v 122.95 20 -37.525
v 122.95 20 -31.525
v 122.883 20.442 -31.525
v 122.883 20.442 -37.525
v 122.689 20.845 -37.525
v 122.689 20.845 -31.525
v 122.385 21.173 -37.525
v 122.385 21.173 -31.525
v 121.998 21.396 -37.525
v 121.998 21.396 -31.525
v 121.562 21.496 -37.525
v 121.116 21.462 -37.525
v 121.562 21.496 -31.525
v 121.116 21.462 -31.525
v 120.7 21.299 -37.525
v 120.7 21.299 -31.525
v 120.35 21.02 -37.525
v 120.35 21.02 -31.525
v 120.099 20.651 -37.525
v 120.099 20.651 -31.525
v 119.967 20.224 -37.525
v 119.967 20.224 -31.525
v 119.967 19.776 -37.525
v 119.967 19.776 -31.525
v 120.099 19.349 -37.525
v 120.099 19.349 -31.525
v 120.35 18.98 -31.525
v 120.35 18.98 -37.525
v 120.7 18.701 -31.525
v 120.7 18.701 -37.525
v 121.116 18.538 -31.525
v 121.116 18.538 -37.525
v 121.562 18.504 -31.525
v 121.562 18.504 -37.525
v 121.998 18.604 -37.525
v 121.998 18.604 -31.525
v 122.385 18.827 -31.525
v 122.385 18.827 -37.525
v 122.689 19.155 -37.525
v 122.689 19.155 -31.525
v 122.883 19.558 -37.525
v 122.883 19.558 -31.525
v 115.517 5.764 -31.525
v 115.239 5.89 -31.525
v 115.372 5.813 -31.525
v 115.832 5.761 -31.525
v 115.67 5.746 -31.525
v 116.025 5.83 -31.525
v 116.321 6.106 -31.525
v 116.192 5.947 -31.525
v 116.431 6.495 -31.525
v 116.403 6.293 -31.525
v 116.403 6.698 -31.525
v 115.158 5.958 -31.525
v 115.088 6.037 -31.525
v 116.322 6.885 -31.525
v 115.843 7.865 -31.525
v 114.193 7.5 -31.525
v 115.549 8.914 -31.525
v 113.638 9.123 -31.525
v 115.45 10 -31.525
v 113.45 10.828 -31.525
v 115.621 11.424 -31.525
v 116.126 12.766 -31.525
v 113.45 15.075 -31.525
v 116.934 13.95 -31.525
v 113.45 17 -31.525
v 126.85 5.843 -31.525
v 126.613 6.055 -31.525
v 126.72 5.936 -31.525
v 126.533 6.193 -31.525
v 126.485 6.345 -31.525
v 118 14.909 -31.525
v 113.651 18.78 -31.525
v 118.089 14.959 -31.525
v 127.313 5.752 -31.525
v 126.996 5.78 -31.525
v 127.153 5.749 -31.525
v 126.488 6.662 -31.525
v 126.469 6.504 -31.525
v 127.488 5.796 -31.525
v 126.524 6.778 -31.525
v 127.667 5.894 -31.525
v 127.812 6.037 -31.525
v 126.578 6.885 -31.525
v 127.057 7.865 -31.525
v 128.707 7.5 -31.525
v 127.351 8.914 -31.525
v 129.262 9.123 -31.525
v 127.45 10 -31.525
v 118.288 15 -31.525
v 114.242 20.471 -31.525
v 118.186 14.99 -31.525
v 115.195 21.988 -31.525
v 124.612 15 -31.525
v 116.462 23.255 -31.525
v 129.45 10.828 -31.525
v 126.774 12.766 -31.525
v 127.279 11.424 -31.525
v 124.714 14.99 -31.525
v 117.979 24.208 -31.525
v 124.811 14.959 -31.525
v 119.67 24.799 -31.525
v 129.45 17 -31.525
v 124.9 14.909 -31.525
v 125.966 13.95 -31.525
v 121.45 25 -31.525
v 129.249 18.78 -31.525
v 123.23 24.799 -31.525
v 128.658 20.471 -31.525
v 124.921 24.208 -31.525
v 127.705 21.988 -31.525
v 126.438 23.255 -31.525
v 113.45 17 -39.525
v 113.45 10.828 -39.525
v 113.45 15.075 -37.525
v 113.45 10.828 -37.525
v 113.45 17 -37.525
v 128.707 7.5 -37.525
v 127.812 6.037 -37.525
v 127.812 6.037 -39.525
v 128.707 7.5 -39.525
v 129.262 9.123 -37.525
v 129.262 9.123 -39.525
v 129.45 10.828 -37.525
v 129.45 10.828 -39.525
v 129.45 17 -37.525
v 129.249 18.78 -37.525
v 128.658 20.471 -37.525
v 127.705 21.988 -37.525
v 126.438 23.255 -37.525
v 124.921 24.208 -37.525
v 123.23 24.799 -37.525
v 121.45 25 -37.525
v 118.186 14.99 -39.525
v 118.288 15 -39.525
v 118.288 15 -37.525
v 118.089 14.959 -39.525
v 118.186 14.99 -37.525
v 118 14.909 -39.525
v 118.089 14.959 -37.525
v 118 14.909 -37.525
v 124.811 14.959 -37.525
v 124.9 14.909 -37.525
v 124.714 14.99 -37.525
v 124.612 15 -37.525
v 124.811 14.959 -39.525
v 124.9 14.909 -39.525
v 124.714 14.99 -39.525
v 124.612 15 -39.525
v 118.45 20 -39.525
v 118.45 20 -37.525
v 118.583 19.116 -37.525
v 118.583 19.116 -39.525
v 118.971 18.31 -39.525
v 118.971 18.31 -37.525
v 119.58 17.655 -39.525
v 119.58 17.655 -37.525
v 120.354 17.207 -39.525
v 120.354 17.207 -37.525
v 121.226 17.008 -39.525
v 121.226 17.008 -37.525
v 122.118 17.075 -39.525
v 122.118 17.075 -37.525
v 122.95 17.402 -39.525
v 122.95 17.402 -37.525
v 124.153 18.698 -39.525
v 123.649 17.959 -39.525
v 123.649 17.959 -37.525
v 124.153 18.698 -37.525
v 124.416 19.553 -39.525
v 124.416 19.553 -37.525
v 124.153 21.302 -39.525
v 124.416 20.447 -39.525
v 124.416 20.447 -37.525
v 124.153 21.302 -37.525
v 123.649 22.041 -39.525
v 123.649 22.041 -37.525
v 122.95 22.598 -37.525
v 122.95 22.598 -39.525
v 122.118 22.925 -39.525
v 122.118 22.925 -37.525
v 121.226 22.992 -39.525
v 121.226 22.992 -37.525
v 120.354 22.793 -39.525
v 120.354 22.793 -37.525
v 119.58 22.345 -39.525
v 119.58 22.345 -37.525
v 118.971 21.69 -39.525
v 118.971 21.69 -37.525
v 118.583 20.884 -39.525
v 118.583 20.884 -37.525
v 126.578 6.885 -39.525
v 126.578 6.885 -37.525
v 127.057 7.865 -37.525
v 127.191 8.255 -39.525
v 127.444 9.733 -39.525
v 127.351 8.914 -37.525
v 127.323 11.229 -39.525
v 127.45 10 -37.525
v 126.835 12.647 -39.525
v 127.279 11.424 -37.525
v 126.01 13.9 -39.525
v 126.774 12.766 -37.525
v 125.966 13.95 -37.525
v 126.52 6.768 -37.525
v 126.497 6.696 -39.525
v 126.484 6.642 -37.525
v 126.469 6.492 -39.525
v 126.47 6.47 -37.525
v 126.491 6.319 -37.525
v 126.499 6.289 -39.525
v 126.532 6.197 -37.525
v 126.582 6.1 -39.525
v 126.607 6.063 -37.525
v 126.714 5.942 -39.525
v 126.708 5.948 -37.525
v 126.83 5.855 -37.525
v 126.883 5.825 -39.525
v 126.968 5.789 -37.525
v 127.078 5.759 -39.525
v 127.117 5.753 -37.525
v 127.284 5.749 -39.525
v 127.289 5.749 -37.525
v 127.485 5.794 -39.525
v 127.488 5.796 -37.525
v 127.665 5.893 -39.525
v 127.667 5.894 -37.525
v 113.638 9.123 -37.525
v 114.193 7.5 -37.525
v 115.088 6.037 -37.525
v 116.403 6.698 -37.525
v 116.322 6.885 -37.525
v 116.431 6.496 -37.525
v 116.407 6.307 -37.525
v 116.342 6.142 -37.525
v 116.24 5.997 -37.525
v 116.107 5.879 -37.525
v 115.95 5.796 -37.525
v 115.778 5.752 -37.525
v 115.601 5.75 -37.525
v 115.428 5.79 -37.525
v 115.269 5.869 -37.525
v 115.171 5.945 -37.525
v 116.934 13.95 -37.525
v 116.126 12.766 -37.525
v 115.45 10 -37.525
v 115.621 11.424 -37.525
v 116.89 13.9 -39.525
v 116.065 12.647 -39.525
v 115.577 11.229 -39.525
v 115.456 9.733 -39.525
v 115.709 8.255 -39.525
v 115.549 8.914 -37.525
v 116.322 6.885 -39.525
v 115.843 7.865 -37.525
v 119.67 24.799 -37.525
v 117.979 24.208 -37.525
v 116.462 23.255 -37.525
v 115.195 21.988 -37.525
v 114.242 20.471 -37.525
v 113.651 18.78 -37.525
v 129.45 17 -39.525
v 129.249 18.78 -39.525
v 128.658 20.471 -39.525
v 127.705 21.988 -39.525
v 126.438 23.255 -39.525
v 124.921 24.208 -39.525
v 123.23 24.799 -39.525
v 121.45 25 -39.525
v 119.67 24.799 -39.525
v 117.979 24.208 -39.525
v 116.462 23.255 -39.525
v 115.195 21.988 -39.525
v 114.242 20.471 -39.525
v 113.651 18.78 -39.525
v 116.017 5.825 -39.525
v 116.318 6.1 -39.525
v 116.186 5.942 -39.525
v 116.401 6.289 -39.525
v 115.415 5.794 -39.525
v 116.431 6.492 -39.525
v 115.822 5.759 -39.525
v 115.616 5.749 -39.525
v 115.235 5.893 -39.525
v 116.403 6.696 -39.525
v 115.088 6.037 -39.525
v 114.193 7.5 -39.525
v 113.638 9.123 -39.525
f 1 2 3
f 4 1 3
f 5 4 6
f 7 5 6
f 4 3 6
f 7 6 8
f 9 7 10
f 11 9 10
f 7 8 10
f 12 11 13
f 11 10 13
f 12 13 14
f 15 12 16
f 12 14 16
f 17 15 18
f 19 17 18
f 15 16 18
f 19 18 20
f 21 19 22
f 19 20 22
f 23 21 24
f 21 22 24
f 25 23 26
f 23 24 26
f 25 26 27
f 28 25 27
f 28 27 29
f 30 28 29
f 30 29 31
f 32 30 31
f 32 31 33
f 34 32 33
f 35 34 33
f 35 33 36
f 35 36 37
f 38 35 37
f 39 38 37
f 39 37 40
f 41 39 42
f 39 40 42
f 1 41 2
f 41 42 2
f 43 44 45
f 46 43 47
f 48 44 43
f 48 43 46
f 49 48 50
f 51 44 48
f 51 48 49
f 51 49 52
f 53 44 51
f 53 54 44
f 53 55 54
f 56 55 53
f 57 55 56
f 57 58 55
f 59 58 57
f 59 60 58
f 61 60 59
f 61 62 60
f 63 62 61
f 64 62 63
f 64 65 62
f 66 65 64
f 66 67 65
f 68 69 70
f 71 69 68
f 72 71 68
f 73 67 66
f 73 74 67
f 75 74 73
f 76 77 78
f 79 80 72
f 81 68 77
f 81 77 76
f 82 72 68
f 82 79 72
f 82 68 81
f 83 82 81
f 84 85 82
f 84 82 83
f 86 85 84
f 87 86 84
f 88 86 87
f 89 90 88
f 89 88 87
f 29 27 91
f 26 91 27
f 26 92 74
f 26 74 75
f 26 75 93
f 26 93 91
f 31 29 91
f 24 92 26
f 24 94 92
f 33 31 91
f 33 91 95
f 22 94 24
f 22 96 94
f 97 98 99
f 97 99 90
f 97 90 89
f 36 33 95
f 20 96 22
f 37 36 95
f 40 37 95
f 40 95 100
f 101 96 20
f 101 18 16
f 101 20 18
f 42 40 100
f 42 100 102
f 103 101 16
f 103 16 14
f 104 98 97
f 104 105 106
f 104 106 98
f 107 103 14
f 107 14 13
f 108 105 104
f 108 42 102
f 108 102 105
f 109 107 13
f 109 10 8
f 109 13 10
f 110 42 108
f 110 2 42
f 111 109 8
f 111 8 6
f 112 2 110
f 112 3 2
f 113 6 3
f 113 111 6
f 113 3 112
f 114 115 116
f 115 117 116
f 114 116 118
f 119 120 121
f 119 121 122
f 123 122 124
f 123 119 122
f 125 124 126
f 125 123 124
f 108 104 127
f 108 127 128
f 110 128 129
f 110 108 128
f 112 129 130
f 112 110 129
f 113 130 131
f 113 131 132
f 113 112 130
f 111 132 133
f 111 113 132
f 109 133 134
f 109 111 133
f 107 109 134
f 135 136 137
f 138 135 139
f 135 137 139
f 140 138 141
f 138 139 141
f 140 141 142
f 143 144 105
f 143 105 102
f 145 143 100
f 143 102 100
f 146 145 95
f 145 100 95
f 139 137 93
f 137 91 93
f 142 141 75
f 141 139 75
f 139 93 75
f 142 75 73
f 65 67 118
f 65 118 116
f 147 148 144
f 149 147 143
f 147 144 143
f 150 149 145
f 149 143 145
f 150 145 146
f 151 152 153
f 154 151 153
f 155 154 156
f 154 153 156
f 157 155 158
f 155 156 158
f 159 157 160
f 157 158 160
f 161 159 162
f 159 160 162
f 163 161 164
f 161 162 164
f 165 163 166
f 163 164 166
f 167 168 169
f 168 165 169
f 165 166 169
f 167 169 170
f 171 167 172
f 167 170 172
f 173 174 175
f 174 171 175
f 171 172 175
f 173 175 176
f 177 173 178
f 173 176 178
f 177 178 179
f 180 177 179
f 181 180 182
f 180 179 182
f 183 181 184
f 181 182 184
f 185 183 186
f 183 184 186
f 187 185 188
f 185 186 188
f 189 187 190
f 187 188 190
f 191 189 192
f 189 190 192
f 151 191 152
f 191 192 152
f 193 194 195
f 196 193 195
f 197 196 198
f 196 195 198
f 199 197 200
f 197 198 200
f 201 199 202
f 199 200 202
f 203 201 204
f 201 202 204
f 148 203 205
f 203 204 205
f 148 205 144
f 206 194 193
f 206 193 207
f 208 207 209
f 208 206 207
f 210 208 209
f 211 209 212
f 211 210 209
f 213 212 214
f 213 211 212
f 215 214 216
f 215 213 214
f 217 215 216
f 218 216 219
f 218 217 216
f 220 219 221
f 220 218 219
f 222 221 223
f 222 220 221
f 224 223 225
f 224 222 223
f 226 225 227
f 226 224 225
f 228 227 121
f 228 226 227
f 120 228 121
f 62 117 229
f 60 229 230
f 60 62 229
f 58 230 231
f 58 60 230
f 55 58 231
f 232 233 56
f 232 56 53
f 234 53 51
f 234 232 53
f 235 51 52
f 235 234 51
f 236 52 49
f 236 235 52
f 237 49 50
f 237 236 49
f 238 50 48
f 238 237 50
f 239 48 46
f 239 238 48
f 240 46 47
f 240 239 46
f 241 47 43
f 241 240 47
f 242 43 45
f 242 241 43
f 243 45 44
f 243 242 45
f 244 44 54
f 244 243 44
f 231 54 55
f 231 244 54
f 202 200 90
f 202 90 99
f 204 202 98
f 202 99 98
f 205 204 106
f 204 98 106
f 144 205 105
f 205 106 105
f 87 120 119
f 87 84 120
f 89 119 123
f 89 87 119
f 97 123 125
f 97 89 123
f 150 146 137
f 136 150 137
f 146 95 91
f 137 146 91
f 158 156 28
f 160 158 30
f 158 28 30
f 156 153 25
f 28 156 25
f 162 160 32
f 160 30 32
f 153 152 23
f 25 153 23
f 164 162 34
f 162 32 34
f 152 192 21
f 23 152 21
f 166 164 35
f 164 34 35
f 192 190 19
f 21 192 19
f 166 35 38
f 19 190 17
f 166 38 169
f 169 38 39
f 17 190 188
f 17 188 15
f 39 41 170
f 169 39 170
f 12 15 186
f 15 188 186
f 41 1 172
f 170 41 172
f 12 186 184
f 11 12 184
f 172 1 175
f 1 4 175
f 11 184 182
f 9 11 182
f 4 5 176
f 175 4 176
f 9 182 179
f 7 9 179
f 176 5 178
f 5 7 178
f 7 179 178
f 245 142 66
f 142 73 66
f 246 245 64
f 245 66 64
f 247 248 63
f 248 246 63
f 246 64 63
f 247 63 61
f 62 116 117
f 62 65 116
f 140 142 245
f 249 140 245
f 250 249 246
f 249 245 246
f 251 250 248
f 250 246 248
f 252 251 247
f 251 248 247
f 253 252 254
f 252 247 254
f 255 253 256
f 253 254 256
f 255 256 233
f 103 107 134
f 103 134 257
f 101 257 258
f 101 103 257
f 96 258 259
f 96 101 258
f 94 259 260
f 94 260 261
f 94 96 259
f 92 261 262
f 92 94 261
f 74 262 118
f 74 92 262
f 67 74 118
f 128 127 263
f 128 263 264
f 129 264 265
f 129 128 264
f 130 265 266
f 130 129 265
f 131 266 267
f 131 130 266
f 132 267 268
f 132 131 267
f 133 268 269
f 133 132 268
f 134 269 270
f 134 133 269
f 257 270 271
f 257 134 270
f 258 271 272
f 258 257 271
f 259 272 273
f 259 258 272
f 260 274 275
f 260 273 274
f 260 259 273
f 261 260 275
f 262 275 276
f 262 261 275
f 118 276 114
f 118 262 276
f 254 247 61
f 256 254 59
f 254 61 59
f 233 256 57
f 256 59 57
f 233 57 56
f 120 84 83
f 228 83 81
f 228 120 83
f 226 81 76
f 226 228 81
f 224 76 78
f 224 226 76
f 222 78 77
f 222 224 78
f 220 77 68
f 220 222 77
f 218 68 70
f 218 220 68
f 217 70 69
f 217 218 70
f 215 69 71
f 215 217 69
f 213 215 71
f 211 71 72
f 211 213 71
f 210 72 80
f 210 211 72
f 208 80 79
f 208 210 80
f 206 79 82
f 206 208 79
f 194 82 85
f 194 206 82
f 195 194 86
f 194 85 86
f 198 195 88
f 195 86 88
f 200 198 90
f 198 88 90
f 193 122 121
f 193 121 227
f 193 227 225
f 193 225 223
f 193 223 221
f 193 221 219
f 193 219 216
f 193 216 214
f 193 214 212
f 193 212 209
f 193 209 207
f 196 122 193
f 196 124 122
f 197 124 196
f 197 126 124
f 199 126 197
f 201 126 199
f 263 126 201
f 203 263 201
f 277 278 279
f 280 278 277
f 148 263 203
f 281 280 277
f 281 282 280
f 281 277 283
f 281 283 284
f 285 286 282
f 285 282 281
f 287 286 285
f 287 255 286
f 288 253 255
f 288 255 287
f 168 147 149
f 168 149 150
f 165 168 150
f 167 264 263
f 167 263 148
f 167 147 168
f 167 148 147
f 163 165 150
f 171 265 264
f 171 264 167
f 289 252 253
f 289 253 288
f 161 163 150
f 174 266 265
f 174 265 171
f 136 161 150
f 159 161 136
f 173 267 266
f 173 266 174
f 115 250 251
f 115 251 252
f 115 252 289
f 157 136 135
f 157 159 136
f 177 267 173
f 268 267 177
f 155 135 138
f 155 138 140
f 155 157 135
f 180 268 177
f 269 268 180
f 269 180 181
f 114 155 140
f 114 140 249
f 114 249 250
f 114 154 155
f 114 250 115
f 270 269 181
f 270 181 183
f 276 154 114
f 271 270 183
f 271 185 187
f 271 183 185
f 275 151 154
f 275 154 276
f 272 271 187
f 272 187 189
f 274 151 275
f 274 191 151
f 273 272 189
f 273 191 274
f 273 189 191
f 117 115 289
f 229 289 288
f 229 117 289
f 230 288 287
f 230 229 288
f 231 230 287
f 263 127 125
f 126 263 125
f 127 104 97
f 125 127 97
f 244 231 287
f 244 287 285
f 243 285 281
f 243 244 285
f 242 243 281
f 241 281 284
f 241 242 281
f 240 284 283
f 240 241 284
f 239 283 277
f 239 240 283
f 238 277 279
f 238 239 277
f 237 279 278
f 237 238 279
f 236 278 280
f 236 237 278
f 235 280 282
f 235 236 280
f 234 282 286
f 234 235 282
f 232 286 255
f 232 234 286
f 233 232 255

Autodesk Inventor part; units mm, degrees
ref_plane "YZ Plane" through (0, 0, 0) normal (1, 0, 0) x (0, 1, 0)
ref_plane "XZ Plane" through (0, 0, 0) normal (0, 1, 0) x (-1, 0, 0)
sketch "Sketch1" plane through (0, 0, 0) normal (0, 0, 1) x (1, 0, 0)
  line L0 (127.525, 5) -> (129.95, 5)
  line L1 (127.525, 15.075) -> (127.525, 5)
  line L2 (115.375, 15.075) -> (127.525, 15.075)
  line L3 (115.375, 5) -> (115.375, 15.075)
  line L4 (112.95, 5) -> (115.375, 5)
  line L5 (129.95, 5) -> (129.95, 25.025)
  line L6 (115.45, 10) -> (115.45, 6)
  arc A0 (115.45, 10) -> (118.000243, 5.090909) centre (121.45, 10) ccw
  arc A1 (118.000243, 5.090909) -> (118.287722, 5) centre (118.287722, 5.5) ccw
  line L7 (116.45, 5) -> (118.287722, 5)
  arc A2 (115.45, 6) -> (116.45, 5) centre (116.45, 6) ccw
  line L8 (118.287722, 15) -> (116.45, 15)
  arc A3 (118.287722, 15) -> (118.000243, 14.909091) centre (118.287722, 14.5) ccw
  arc A4 (118.000243, 14.909091) -> (115.45, 10) centre (121.45, 10) ccw
  line L9 (115.45, 14) -> (115.45, 10)
  arc A5 (116.45, 15) -> (115.45, 14) centre (116.45, 14) ccw
  line L10 (127.45, 10) -> (127.45, 14)
  arc A6 (127.45, 10) -> (124.899757, 14.909091) centre (121.45, 10) ccw
  arc A7 (124.899757, 14.909091) -> (124.612278, 15) centre (124.612278, 14.5) ccw
  line L11 (126.45, 15) -> (124.612278, 15)
  arc A8 (127.45, 14) -> (126.45, 15) centre (126.45, 14) ccw
  line L12 (124.612278, 5) -> (126.45, 5)
  arc A9 (124.612278, 5) -> (124.899757, 5.090909) centre (124.612278, 5.5) ccw
  arc A10 (124.899757, 5.090909) -> (127.45, 10) centre (121.45, 10) ccw
  line L13 (127.45, 6) -> (127.45, 10)
  arc A11 (126.45, 5) -> (127.45, 6) centre (126.45, 6) ccw
  arc A12 (118.000243, 5.090909) -> (118.287722, 5) centre (118.287722, 5.5) ccw
  arc A13 (118.000243, 14.909091) -> (118.000243, 5.090909) centre (121.45, 10) ccw
  arc A14 (118.287722, 15) -> (118.000243, 14.909091) centre (118.287722, 14.5) ccw
  line L14 (118.287722, 15) -> (124.612278, 15)
  arc A15 (124.899757, 14.909091) -> (124.612278, 15) centre (124.612278, 14.5) ccw
  arc A16 (124.899757, 5.090909) -> (124.899757, 14.909091) centre (121.45, 10) ccw
  arc A17 (124.612278, 5) -> (124.899757, 5.090909) centre (124.612278, 5.5) ccw
  line L15 (124.612278, 5) -> (118.287722, 5)
  line L16 (127.45, 15.075) -> (129.45, 15.075)
  line L17 (129.45, 15.075) -> (129.45, 5)
  line L18 (129.45, 5) -> (127.45, 5)
  line L19 (127.45, 5) -> (127.45, 15.075)
  line L20 (121.45, 10) -> (121.45, 5)
  arc A18 (127.157107, 5.292893) -> (129.45, 10.828427) centre (121.621573, 10.828427) ccw
  line L21 (115.45, 15.075) -> (113.45, 15.075)
  line L22 (113.45, 15.075) -> (113.45, 5)
  line L23 (113.45, 5) -> (115.45, 5)
  line L24 (115.45, 5) -> (115.45, 15.075)
  arc A19 (113.45, 10.828427) -> (115.742893, 5.292893) centre (121.278427, 10.828427) ccw
  line L25 (121.45, 25) -> (121.45, 15)
  circle A20 centre (121.45, 20) radius 1.5
  circle A21 centre (121.45, 20) radius 3
  line L26 (129.45, 15) -> (113.45, 15)
  line L27 (113.45, 15) -> (113.45, 25)
  line L28 (113.45, 25) -> (129.45, 25)
  line L29 (129.45, 25) -> (129.45, 15)
  arc A22 (129.45, 17) -> (121.45, 25) centre (121.45, 17) ccw
  arc A23 (121.45, 25) -> (113.45, 17) centre (121.45, 17) ccw
  circle A24 centre (121.45, 20) radius 1.4375
  line L30 (129.95, 25.025) -> (112.95, 25.025)
  line L31 (112.95, 25.025) -> (112.95, 5)
  point P0 (0, 0)
  point P1 (112.95, 16.464466)
  point P2 (115.742893, 5.292893)
  point P3 (127.45, 5.602175)
  point P4 (115.45, 5.602175)
  point P5 (115.45, 15)
  point P6 (127.45, 15)
  dimension "d0" = 2
  dimension "d2" = 3
  dimension "d3" = 6
  dimension "d10" = 10
ref_plane "Work Plane1" through (127.525, 15.075, -31.525) normal (0, 0, -1) x (-1, 0, 0)
sketch "Sketch1 outline for Extrusion1" plane through (0, 0, 0) normal (0, 0, 1) x (1, 0, 0)
  arc A0 (124.612278, 15) -> (124.899757, 14.909091) centre (124.612278, 14.5) cw
  line L0 (118.287722, 15) -> (124.612278, 15)
  arc A1 (124.899757, 14.909091) -> (127.45, 10) centre (121.45, 10) cw
  arc A2 (118.000243, 14.909091) -> (118.287722, 15) centre (118.287722, 14.5) cw
  arc A3 (127.45, 10) -> (124.899757, 5.090909) centre (121.45, 10) cw
  arc A4 (115.45, 10) -> (118.000243, 14.909091) centre (121.45, 10) cw
  arc A5 (124.899757, 5.090909) -> (124.612278, 5) centre (124.612278, 5.5) cw
  arc A6 (118.000243, 5.090909) -> (115.45, 10) centre (121.45, 10) cw
  line L1 (124.612278, 5) -> (126.45, 5)
  arc A7 (118.287722, 5) -> (118.000243, 5.090909) centre (118.287722, 5.5) cw
  arc A8 (126.45, 5) -> (127.157107, 5.292893) centre (126.45, 6) ccw
  line L2 (116.45, 5) -> (118.287722, 5)
  arc A9 (127.157107, 5.292893) -> (129.45, 10.828427) centre (121.621573, 10.828427) ccw
  arc A10 (115.742893, 5.292893) -> (116.45, 5) centre (116.45, 6) ccw
  line L3 (129.45, 10.828427) -> (129.45, 15.075)
  arc A11 (113.45, 10.828427) -> (115.742893, 5.292893) centre (121.278427, 10.828427) ccw
  line L4 (129.45, 15.075) -> (129.45, 17)
  line L5 (113.45, 15.075) -> (113.45, 10.828427)
  arc A12 (129.45, 17) -> (121.45, 25) centre (121.45, 17) ccw
  line L6 (113.45, 17) -> (113.45, 15.075)
  arc A13 (121.45, 25) -> (113.45, 17) centre (121.45, 17) ccw
  circle A14 centre (121.45, 20) radius 1.5
extrude "Extrusion1" add sketch "Sketch1 outline for Extrusion1" against normal blind 6 from surface at -31.525
fillet "Fillet1" radius 0.75 4 edges at (124.8998, 5.0909, -34.525) (118.0002, 5.0909, -34.525) (124.6123, 5, -34.525) (118.2877, 5, -34.525)
sketch "Sketch2" plane through (121.45, 14.820968, -37.525) normal (0, 0, -1) x (-1, 0, 0)
  arc A0 (6.362384, -8.784005) -> (8, -3.992541) centre (0.171573, -3.992541) ccw
  line L0 (8, 2.179032) -> (8, -3.992541)
  line L1 (-8, -3.992541) -> (-8, 2.179032)
  arc A1 (-8, -3.992541) -> (-6.362384, -8.784005) centre (-0.171573, -3.992541) ccw
  arc A2 (-3.449757, 0.088123) -> (-5.128245, -7.935627) centre (0, -4.820968) ccw
  arc A3 (-3.162278, 0.179032) -> (-3.449757, 0.088123) centre (-3.162278, -0.320968) ccw
  arc A4 (3.449757, 0.088123) -> (3.162278, 0.179032) centre (3.162278, -0.320968) ccw
  arc A5 (5.128245, -7.935627) -> (3.449757, 0.088123) centre (0, -4.820968) ccw
  circle A6 centre (0, 5.179032) radius 3
  line L2 (3.162278, 0.179032) -> (-3.162278, 0.179032)
  circle A7 centre (0, 5.179032) radius 1.5
  arc A8 (8, 2.179032) -> (-8, 2.179032) centre (0, 2.179032) ccw
  arc A9 (5.128245, -7.935627) -> (6.362384, -8.784005) centre (5.769275, -8.32496) ccw
  arc A10 (-6.362384, -8.784005) -> (-5.128245, -7.935627) centre (-5.769275, -8.32496) ccw
  point P0 (121.45, -14.820968)
  dimension "d7" = 6
sketch "Sketch2 outline for Extrusion2" plane through (121.45, 14.820968, -37.525) normal (0, 0, -1) x (-1, 0, 0)
  arc A0 (5.128245, -7.935627) -> (6.362384, -8.784005) centre (5.769275, -8.32496) ccw
  arc A1 (3.449757, 0.088123) -> (5.128245, -7.935627) centre (0, -4.820968) cw
  arc A2 (6.362384, -8.784005) -> (8, -3.992541) centre (0.171573, -3.992541) ccw
  arc A3 (3.162278, 0.179032) -> (3.449757, 0.088123) centre (3.162278, -0.320968) cw
  line L0 (8, -3.992541) -> (8, 2.179032)
  line L1 (-3.162278, 0.179032) -> (3.162278, 0.179032)
  arc A4 (8, 2.179032) -> (-8, 2.179032) centre (0, 2.179032) ccw
  arc A5 (-3.449757, 0.088123) -> (-3.162278, 0.179032) centre (-3.162278, -0.320968) cw
  line L2 (-8, 2.179032) -> (-8, -3.992541)
  arc A6 (-5.128245, -7.935627) -> (-3.449757, 0.088123) centre (0, -4.820968) cw
  arc A7 (-8, -3.992541) -> (-6.362384, -8.784005) centre (-0.171573, -3.992541) ccw
  arc A8 (-6.362384, -8.784005) -> (-5.128245, -7.935627) centre (-5.769275, -8.32496) ccw
  circle A9 centre (0, 5.179032) radius 3
extrude "Extrusion2" add sketch "Sketch2 outline for Extrusion2" along normal blind 2
properties part number "Y Stage Motor Clamp V5"
